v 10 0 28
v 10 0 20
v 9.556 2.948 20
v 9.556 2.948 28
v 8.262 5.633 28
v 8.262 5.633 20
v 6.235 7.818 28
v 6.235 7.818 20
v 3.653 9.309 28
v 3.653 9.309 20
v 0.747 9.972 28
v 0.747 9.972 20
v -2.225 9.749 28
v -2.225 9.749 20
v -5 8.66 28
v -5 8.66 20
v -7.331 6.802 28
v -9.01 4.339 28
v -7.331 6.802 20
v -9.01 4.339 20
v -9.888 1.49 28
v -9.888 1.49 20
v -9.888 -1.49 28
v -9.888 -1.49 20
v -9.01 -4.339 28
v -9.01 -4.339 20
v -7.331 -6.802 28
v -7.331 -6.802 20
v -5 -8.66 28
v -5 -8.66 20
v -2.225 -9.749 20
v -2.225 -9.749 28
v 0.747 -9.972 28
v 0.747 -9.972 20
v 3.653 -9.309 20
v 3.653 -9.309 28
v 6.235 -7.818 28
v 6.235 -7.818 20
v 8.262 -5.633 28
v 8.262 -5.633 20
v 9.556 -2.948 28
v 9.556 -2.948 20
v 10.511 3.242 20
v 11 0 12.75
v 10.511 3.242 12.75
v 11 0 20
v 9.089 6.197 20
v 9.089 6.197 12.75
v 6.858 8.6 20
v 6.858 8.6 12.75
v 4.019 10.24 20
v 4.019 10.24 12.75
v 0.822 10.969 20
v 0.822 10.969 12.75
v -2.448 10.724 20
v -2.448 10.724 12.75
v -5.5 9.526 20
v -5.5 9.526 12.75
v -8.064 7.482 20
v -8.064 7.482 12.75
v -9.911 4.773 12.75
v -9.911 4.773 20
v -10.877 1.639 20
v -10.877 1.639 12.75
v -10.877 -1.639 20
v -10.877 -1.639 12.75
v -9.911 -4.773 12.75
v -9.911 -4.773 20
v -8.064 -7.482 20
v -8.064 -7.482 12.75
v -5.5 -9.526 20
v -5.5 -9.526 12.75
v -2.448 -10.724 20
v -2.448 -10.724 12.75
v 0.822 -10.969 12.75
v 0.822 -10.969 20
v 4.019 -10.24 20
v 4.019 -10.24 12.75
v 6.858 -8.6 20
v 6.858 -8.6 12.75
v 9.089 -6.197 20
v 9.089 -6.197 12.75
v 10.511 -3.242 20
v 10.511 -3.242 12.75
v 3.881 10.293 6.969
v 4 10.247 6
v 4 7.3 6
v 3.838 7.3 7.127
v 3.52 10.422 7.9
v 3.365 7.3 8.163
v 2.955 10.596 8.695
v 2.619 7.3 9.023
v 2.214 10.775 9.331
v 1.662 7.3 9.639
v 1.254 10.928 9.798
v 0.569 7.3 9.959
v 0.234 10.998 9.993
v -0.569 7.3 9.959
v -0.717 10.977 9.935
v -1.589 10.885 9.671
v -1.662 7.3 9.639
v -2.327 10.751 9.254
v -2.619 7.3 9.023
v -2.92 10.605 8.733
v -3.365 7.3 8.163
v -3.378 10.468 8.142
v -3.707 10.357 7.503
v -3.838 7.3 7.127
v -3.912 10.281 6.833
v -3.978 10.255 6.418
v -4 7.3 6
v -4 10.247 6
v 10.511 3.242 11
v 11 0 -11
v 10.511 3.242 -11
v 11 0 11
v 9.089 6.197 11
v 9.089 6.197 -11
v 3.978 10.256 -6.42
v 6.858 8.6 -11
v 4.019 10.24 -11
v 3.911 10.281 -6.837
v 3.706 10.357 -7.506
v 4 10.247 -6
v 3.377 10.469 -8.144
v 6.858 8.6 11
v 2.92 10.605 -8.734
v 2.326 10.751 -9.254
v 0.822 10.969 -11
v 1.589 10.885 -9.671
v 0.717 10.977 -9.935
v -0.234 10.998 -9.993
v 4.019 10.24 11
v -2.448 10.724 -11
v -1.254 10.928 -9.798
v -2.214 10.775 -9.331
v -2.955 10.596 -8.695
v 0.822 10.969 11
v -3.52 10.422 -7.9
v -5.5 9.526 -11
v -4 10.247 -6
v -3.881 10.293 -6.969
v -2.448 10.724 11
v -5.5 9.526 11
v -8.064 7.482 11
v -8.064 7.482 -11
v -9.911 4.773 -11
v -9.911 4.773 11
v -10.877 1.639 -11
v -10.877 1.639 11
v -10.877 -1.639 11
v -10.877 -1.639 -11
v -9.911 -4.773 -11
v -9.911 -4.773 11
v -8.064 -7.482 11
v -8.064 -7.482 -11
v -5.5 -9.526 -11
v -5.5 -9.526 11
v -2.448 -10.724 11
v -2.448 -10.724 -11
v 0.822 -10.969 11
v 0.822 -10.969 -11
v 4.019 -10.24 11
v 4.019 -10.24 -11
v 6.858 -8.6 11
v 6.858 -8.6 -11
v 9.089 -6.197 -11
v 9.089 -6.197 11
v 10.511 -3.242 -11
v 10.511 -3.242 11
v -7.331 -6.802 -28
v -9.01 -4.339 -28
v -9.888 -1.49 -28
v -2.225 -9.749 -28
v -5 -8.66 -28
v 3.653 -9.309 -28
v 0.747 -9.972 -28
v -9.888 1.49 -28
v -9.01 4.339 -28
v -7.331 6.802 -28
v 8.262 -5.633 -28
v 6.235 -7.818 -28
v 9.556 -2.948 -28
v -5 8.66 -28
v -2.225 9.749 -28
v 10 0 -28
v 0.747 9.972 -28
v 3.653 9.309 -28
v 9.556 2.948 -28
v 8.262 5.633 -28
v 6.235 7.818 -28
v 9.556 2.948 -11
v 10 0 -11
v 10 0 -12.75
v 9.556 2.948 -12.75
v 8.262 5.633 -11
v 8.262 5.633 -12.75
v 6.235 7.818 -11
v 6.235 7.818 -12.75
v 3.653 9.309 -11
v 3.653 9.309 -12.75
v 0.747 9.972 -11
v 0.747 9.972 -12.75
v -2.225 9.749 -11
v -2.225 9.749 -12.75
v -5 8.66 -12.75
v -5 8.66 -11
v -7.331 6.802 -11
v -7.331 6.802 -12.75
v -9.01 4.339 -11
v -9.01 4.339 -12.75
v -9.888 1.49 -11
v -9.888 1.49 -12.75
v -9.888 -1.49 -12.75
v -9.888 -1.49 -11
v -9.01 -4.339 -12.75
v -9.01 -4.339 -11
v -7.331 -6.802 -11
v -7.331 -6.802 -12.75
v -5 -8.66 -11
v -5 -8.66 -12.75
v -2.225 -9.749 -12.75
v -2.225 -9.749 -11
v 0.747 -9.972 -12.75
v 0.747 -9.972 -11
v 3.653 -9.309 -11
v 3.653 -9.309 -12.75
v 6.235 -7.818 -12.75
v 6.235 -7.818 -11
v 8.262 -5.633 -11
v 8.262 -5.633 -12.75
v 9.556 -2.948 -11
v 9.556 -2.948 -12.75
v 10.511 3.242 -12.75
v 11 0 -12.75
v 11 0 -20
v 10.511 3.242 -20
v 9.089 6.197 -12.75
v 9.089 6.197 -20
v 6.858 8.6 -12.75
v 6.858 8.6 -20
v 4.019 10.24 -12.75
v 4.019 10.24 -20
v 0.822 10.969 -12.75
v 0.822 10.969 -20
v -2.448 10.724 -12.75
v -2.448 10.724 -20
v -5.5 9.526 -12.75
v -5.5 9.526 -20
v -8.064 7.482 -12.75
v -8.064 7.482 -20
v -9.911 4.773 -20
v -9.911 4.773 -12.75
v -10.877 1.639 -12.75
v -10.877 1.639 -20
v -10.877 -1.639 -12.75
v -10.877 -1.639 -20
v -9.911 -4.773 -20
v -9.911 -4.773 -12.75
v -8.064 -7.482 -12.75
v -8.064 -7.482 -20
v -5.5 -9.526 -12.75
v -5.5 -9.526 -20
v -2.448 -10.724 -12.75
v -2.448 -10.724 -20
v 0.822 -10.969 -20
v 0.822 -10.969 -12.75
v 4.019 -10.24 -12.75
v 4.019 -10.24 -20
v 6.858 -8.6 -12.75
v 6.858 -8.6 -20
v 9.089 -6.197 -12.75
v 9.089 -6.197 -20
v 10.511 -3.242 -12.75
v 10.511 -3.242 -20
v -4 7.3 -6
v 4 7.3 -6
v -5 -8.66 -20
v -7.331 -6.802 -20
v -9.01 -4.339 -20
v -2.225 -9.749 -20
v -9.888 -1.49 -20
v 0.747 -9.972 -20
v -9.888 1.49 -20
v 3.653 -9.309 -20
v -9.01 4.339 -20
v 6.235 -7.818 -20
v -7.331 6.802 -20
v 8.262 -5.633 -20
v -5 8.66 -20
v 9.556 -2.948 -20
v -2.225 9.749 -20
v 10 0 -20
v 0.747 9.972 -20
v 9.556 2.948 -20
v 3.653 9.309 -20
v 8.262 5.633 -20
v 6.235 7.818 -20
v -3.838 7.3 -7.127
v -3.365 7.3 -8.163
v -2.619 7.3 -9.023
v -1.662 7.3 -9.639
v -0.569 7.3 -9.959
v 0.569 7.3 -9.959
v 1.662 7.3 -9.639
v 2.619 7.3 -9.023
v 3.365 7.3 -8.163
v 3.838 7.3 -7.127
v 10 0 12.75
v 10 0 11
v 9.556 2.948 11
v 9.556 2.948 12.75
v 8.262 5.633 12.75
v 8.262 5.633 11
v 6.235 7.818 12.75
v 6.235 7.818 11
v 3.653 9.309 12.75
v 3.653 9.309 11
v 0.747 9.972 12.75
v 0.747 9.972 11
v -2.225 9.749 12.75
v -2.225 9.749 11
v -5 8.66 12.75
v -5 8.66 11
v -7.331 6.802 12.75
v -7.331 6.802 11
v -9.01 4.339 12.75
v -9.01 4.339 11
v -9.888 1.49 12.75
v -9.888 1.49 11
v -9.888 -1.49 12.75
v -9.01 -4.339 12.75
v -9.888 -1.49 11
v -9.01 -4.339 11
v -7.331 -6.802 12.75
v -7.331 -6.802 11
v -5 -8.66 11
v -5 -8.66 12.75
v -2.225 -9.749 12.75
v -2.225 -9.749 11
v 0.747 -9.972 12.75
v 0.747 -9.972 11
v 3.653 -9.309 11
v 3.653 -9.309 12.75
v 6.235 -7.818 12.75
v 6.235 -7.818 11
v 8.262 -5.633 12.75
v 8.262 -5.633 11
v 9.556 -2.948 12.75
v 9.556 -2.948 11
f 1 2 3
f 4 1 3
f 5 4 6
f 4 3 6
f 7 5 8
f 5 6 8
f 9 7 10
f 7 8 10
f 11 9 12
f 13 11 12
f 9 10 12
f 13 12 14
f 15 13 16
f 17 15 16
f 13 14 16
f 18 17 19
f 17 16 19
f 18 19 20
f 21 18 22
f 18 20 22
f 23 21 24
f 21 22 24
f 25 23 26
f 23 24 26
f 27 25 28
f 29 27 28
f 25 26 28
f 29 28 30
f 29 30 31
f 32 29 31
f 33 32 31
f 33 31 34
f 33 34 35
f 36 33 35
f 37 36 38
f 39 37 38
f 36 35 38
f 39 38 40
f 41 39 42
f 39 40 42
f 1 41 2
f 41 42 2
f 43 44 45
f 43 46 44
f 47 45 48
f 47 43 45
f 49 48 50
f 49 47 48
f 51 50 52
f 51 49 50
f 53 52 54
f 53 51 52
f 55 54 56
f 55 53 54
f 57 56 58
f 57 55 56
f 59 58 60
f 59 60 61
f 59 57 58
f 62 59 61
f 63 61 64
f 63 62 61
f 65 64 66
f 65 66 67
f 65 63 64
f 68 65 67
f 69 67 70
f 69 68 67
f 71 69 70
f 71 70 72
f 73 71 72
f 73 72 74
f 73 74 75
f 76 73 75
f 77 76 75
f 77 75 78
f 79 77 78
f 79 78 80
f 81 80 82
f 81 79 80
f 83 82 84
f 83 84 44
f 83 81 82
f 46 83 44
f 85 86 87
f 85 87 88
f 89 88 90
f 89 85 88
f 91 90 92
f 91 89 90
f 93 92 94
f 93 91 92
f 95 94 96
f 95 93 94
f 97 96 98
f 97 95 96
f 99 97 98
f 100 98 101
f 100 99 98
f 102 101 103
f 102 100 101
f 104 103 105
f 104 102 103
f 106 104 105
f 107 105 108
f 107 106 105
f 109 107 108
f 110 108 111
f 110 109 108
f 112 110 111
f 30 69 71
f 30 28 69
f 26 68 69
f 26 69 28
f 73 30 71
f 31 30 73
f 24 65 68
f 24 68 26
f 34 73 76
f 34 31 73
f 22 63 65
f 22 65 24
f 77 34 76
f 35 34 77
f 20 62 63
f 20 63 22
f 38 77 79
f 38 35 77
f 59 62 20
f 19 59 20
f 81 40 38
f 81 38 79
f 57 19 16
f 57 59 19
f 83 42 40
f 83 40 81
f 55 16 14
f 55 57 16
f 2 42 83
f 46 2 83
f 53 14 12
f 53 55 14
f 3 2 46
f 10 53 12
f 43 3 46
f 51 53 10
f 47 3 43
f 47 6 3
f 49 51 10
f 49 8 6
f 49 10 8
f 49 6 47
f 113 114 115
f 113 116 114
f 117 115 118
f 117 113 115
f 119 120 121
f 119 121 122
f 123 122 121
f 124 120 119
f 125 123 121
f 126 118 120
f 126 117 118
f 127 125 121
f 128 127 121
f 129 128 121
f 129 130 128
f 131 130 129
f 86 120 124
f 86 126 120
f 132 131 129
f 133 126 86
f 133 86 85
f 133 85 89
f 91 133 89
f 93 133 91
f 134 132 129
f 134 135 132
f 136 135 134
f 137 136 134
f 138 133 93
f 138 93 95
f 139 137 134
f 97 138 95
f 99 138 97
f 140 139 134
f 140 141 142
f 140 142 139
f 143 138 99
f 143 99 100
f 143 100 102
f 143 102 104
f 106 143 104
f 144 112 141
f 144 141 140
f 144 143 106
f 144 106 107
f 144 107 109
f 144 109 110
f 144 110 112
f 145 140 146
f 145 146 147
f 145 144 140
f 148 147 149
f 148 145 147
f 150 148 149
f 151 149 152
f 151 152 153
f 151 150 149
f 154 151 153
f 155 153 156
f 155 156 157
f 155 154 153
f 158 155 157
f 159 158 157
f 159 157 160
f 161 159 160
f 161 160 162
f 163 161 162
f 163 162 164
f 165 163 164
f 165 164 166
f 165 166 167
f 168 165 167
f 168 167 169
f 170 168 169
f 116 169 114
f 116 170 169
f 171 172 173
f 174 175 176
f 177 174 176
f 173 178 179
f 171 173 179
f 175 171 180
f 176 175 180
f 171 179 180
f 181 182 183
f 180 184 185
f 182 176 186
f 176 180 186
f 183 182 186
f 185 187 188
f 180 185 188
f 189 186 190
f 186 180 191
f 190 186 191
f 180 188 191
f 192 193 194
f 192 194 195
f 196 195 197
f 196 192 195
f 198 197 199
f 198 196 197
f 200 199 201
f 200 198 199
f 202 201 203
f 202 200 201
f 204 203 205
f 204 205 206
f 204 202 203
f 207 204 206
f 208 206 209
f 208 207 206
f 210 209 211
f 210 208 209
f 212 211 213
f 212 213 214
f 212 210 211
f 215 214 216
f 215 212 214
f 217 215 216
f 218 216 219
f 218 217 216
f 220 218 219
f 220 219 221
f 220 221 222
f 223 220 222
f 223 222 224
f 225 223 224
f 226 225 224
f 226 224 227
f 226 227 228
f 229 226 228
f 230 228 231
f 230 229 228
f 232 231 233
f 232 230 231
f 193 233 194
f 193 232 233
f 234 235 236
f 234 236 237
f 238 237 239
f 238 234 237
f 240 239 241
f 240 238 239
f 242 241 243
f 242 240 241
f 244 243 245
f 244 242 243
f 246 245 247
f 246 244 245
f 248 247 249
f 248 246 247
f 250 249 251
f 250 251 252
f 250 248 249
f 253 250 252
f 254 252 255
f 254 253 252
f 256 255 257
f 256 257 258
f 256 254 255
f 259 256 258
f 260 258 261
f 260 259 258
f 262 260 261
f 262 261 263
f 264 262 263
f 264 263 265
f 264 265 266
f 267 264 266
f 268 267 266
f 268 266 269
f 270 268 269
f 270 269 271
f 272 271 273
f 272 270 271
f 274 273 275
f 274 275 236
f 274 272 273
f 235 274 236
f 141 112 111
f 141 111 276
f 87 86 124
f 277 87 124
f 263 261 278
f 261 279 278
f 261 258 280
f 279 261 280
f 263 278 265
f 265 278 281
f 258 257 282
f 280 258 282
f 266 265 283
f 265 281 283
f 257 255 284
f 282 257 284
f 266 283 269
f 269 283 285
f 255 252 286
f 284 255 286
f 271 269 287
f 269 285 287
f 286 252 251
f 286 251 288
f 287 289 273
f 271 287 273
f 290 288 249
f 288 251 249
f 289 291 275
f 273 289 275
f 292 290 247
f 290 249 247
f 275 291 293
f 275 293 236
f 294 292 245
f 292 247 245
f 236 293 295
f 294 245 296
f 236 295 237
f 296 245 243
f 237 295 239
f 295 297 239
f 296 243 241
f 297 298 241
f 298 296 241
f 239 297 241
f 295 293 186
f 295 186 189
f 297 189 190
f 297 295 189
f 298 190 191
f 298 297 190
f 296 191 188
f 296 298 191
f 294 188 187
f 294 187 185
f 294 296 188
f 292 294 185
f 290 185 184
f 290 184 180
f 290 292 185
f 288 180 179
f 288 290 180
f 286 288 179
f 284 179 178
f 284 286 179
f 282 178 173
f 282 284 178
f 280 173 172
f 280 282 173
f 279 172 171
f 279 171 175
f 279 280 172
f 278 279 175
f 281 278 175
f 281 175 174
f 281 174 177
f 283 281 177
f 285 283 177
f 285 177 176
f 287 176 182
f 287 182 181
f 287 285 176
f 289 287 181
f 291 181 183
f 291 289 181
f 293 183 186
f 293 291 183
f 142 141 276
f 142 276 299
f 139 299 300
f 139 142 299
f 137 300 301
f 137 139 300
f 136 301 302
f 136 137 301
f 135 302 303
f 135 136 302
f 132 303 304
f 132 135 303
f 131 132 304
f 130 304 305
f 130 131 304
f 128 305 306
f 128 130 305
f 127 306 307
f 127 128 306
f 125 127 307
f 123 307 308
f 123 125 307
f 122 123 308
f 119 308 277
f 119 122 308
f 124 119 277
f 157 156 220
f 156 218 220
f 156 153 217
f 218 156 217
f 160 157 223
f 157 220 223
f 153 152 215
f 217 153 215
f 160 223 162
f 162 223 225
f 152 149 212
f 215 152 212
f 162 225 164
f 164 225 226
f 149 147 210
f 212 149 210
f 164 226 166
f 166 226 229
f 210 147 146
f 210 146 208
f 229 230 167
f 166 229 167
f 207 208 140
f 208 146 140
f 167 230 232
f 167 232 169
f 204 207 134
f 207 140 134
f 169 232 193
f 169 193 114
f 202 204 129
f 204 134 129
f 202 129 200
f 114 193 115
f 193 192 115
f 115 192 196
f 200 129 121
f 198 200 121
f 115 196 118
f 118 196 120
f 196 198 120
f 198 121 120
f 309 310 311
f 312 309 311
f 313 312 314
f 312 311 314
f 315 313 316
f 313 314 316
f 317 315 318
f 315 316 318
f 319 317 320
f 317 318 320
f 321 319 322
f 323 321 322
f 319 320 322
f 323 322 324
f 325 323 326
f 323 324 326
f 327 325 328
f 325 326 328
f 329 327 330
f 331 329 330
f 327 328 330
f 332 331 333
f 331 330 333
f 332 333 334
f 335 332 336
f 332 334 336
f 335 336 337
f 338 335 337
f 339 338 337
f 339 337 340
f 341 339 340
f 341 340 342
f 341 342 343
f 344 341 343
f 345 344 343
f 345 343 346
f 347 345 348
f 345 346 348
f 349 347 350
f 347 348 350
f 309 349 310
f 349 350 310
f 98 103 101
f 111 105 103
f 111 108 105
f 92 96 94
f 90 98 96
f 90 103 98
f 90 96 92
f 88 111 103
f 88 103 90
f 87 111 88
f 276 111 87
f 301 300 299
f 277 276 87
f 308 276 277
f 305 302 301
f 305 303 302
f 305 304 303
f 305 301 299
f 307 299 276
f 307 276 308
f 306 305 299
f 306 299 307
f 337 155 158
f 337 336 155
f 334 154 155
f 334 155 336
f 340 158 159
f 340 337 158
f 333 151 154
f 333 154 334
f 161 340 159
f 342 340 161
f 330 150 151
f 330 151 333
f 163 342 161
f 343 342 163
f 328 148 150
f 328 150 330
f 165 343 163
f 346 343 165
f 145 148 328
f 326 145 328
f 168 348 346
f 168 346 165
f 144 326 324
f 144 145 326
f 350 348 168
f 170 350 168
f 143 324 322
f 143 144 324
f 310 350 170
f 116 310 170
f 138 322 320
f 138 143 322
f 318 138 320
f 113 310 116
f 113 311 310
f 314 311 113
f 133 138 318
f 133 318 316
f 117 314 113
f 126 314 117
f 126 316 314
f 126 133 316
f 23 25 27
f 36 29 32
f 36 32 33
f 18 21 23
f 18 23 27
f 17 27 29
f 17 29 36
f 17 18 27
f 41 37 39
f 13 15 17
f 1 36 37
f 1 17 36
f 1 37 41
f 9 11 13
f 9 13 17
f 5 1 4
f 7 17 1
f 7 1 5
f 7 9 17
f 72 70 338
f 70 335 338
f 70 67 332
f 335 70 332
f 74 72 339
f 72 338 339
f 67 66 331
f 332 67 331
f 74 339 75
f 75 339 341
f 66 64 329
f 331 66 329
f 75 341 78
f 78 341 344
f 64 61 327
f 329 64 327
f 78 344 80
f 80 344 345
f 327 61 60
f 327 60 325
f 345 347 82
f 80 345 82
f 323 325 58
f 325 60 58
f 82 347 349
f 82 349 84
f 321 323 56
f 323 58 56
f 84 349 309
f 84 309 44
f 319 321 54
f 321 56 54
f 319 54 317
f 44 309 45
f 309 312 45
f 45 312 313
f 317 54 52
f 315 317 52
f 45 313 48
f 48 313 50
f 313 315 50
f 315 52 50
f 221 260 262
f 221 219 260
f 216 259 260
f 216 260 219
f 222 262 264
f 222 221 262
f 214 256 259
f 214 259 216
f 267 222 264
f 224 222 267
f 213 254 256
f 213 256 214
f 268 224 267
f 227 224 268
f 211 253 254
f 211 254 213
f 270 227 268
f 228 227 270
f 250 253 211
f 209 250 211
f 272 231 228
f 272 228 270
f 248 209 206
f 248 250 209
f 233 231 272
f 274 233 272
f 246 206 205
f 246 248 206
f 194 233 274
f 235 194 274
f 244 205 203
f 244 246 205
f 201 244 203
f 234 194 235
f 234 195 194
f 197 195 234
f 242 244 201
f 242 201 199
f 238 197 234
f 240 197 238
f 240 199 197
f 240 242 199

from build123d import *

# Parameters (mm, degrees)
SKETCH2_R           = 11
BOSS_EXTRUDE1_DEPTH = 20
SKETCH3_R           = 10
BOSS_EXTRUDE2_DEPTH = 8
SKETCH4_W           = 8
SKETCH4_H           = 12
CUT_EXTRUDE1_DEPTH  = 3.7
SKETCH6_OUTSIDE_W   = 36.812
SKETCH6_OUTSIDE_H   = 36.812
SKETCH6_OUTSIDE_R   = 10
CUT_EXTRUDE4_DEPTH  = 1.75


with BuildPart() as part:
    # Sketch2 → Boss-Extrude1 (new body)
    with BuildSketch(Plane.XY):
        Circle(SKETCH2_R)
    extrude(amount=BOSS_EXTRUDE1_DEPTH)

    # Sketch3 → Boss-Extrude2 (add)
    with BuildSketch(Plane.XY.offset(20)):
        Circle(SKETCH3_R)
    extrude(amount=BOSS_EXTRUDE2_DEPTH)

    # Mirror1: part across plane


with BuildPart() as part_1:
    add(part.part)
    add(part.part.mirror(Plane.XY))

    # Sketch4 → Cut-Extrude1 (cut)
    with BuildSketch(Plane(origin=(0, 11, 0), x_dir=(1, 0, 0), z_dir=(0, 1, 0))):
        Rectangle(SKETCH4_W, SKETCH4_H)
        with BuildLine():
            ThreePointArc((-4, 6), (0, 10), (4, 6))
            Line((4, 6), (-4, 6))
        make_face()
        with BuildLine():
            Line((-4, -6), (4, -6))
            ThreePointArc((4, -6), (0, -10), (-4, -6))
        make_face()
    extrude(amount=-CUT_EXTRUDE1_DEPTH, mode=Mode.SUBTRACT)

    # Sketch6 outside → Cut-Extrude4 (cut)
    with BuildSketch(Plane.XY.offset(11)):
        Rectangle(SKETCH6_OUTSIDE_W, SKETCH6_OUTSIDE_H)
        Circle(SKETCH6_OUTSIDE_R, mode=Mode.SUBTRACT)
    cut_extrude4 = extrude(amount=CUT_EXTRUDE4_DEPTH, mode=Mode.SUBTRACT)

    # Mirror2: Cut-Extrude4 across plane
    add(cut_extrude4.mirror(Plane.XY), mode=Mode.SUBTRACT)


solid = part_1.part
